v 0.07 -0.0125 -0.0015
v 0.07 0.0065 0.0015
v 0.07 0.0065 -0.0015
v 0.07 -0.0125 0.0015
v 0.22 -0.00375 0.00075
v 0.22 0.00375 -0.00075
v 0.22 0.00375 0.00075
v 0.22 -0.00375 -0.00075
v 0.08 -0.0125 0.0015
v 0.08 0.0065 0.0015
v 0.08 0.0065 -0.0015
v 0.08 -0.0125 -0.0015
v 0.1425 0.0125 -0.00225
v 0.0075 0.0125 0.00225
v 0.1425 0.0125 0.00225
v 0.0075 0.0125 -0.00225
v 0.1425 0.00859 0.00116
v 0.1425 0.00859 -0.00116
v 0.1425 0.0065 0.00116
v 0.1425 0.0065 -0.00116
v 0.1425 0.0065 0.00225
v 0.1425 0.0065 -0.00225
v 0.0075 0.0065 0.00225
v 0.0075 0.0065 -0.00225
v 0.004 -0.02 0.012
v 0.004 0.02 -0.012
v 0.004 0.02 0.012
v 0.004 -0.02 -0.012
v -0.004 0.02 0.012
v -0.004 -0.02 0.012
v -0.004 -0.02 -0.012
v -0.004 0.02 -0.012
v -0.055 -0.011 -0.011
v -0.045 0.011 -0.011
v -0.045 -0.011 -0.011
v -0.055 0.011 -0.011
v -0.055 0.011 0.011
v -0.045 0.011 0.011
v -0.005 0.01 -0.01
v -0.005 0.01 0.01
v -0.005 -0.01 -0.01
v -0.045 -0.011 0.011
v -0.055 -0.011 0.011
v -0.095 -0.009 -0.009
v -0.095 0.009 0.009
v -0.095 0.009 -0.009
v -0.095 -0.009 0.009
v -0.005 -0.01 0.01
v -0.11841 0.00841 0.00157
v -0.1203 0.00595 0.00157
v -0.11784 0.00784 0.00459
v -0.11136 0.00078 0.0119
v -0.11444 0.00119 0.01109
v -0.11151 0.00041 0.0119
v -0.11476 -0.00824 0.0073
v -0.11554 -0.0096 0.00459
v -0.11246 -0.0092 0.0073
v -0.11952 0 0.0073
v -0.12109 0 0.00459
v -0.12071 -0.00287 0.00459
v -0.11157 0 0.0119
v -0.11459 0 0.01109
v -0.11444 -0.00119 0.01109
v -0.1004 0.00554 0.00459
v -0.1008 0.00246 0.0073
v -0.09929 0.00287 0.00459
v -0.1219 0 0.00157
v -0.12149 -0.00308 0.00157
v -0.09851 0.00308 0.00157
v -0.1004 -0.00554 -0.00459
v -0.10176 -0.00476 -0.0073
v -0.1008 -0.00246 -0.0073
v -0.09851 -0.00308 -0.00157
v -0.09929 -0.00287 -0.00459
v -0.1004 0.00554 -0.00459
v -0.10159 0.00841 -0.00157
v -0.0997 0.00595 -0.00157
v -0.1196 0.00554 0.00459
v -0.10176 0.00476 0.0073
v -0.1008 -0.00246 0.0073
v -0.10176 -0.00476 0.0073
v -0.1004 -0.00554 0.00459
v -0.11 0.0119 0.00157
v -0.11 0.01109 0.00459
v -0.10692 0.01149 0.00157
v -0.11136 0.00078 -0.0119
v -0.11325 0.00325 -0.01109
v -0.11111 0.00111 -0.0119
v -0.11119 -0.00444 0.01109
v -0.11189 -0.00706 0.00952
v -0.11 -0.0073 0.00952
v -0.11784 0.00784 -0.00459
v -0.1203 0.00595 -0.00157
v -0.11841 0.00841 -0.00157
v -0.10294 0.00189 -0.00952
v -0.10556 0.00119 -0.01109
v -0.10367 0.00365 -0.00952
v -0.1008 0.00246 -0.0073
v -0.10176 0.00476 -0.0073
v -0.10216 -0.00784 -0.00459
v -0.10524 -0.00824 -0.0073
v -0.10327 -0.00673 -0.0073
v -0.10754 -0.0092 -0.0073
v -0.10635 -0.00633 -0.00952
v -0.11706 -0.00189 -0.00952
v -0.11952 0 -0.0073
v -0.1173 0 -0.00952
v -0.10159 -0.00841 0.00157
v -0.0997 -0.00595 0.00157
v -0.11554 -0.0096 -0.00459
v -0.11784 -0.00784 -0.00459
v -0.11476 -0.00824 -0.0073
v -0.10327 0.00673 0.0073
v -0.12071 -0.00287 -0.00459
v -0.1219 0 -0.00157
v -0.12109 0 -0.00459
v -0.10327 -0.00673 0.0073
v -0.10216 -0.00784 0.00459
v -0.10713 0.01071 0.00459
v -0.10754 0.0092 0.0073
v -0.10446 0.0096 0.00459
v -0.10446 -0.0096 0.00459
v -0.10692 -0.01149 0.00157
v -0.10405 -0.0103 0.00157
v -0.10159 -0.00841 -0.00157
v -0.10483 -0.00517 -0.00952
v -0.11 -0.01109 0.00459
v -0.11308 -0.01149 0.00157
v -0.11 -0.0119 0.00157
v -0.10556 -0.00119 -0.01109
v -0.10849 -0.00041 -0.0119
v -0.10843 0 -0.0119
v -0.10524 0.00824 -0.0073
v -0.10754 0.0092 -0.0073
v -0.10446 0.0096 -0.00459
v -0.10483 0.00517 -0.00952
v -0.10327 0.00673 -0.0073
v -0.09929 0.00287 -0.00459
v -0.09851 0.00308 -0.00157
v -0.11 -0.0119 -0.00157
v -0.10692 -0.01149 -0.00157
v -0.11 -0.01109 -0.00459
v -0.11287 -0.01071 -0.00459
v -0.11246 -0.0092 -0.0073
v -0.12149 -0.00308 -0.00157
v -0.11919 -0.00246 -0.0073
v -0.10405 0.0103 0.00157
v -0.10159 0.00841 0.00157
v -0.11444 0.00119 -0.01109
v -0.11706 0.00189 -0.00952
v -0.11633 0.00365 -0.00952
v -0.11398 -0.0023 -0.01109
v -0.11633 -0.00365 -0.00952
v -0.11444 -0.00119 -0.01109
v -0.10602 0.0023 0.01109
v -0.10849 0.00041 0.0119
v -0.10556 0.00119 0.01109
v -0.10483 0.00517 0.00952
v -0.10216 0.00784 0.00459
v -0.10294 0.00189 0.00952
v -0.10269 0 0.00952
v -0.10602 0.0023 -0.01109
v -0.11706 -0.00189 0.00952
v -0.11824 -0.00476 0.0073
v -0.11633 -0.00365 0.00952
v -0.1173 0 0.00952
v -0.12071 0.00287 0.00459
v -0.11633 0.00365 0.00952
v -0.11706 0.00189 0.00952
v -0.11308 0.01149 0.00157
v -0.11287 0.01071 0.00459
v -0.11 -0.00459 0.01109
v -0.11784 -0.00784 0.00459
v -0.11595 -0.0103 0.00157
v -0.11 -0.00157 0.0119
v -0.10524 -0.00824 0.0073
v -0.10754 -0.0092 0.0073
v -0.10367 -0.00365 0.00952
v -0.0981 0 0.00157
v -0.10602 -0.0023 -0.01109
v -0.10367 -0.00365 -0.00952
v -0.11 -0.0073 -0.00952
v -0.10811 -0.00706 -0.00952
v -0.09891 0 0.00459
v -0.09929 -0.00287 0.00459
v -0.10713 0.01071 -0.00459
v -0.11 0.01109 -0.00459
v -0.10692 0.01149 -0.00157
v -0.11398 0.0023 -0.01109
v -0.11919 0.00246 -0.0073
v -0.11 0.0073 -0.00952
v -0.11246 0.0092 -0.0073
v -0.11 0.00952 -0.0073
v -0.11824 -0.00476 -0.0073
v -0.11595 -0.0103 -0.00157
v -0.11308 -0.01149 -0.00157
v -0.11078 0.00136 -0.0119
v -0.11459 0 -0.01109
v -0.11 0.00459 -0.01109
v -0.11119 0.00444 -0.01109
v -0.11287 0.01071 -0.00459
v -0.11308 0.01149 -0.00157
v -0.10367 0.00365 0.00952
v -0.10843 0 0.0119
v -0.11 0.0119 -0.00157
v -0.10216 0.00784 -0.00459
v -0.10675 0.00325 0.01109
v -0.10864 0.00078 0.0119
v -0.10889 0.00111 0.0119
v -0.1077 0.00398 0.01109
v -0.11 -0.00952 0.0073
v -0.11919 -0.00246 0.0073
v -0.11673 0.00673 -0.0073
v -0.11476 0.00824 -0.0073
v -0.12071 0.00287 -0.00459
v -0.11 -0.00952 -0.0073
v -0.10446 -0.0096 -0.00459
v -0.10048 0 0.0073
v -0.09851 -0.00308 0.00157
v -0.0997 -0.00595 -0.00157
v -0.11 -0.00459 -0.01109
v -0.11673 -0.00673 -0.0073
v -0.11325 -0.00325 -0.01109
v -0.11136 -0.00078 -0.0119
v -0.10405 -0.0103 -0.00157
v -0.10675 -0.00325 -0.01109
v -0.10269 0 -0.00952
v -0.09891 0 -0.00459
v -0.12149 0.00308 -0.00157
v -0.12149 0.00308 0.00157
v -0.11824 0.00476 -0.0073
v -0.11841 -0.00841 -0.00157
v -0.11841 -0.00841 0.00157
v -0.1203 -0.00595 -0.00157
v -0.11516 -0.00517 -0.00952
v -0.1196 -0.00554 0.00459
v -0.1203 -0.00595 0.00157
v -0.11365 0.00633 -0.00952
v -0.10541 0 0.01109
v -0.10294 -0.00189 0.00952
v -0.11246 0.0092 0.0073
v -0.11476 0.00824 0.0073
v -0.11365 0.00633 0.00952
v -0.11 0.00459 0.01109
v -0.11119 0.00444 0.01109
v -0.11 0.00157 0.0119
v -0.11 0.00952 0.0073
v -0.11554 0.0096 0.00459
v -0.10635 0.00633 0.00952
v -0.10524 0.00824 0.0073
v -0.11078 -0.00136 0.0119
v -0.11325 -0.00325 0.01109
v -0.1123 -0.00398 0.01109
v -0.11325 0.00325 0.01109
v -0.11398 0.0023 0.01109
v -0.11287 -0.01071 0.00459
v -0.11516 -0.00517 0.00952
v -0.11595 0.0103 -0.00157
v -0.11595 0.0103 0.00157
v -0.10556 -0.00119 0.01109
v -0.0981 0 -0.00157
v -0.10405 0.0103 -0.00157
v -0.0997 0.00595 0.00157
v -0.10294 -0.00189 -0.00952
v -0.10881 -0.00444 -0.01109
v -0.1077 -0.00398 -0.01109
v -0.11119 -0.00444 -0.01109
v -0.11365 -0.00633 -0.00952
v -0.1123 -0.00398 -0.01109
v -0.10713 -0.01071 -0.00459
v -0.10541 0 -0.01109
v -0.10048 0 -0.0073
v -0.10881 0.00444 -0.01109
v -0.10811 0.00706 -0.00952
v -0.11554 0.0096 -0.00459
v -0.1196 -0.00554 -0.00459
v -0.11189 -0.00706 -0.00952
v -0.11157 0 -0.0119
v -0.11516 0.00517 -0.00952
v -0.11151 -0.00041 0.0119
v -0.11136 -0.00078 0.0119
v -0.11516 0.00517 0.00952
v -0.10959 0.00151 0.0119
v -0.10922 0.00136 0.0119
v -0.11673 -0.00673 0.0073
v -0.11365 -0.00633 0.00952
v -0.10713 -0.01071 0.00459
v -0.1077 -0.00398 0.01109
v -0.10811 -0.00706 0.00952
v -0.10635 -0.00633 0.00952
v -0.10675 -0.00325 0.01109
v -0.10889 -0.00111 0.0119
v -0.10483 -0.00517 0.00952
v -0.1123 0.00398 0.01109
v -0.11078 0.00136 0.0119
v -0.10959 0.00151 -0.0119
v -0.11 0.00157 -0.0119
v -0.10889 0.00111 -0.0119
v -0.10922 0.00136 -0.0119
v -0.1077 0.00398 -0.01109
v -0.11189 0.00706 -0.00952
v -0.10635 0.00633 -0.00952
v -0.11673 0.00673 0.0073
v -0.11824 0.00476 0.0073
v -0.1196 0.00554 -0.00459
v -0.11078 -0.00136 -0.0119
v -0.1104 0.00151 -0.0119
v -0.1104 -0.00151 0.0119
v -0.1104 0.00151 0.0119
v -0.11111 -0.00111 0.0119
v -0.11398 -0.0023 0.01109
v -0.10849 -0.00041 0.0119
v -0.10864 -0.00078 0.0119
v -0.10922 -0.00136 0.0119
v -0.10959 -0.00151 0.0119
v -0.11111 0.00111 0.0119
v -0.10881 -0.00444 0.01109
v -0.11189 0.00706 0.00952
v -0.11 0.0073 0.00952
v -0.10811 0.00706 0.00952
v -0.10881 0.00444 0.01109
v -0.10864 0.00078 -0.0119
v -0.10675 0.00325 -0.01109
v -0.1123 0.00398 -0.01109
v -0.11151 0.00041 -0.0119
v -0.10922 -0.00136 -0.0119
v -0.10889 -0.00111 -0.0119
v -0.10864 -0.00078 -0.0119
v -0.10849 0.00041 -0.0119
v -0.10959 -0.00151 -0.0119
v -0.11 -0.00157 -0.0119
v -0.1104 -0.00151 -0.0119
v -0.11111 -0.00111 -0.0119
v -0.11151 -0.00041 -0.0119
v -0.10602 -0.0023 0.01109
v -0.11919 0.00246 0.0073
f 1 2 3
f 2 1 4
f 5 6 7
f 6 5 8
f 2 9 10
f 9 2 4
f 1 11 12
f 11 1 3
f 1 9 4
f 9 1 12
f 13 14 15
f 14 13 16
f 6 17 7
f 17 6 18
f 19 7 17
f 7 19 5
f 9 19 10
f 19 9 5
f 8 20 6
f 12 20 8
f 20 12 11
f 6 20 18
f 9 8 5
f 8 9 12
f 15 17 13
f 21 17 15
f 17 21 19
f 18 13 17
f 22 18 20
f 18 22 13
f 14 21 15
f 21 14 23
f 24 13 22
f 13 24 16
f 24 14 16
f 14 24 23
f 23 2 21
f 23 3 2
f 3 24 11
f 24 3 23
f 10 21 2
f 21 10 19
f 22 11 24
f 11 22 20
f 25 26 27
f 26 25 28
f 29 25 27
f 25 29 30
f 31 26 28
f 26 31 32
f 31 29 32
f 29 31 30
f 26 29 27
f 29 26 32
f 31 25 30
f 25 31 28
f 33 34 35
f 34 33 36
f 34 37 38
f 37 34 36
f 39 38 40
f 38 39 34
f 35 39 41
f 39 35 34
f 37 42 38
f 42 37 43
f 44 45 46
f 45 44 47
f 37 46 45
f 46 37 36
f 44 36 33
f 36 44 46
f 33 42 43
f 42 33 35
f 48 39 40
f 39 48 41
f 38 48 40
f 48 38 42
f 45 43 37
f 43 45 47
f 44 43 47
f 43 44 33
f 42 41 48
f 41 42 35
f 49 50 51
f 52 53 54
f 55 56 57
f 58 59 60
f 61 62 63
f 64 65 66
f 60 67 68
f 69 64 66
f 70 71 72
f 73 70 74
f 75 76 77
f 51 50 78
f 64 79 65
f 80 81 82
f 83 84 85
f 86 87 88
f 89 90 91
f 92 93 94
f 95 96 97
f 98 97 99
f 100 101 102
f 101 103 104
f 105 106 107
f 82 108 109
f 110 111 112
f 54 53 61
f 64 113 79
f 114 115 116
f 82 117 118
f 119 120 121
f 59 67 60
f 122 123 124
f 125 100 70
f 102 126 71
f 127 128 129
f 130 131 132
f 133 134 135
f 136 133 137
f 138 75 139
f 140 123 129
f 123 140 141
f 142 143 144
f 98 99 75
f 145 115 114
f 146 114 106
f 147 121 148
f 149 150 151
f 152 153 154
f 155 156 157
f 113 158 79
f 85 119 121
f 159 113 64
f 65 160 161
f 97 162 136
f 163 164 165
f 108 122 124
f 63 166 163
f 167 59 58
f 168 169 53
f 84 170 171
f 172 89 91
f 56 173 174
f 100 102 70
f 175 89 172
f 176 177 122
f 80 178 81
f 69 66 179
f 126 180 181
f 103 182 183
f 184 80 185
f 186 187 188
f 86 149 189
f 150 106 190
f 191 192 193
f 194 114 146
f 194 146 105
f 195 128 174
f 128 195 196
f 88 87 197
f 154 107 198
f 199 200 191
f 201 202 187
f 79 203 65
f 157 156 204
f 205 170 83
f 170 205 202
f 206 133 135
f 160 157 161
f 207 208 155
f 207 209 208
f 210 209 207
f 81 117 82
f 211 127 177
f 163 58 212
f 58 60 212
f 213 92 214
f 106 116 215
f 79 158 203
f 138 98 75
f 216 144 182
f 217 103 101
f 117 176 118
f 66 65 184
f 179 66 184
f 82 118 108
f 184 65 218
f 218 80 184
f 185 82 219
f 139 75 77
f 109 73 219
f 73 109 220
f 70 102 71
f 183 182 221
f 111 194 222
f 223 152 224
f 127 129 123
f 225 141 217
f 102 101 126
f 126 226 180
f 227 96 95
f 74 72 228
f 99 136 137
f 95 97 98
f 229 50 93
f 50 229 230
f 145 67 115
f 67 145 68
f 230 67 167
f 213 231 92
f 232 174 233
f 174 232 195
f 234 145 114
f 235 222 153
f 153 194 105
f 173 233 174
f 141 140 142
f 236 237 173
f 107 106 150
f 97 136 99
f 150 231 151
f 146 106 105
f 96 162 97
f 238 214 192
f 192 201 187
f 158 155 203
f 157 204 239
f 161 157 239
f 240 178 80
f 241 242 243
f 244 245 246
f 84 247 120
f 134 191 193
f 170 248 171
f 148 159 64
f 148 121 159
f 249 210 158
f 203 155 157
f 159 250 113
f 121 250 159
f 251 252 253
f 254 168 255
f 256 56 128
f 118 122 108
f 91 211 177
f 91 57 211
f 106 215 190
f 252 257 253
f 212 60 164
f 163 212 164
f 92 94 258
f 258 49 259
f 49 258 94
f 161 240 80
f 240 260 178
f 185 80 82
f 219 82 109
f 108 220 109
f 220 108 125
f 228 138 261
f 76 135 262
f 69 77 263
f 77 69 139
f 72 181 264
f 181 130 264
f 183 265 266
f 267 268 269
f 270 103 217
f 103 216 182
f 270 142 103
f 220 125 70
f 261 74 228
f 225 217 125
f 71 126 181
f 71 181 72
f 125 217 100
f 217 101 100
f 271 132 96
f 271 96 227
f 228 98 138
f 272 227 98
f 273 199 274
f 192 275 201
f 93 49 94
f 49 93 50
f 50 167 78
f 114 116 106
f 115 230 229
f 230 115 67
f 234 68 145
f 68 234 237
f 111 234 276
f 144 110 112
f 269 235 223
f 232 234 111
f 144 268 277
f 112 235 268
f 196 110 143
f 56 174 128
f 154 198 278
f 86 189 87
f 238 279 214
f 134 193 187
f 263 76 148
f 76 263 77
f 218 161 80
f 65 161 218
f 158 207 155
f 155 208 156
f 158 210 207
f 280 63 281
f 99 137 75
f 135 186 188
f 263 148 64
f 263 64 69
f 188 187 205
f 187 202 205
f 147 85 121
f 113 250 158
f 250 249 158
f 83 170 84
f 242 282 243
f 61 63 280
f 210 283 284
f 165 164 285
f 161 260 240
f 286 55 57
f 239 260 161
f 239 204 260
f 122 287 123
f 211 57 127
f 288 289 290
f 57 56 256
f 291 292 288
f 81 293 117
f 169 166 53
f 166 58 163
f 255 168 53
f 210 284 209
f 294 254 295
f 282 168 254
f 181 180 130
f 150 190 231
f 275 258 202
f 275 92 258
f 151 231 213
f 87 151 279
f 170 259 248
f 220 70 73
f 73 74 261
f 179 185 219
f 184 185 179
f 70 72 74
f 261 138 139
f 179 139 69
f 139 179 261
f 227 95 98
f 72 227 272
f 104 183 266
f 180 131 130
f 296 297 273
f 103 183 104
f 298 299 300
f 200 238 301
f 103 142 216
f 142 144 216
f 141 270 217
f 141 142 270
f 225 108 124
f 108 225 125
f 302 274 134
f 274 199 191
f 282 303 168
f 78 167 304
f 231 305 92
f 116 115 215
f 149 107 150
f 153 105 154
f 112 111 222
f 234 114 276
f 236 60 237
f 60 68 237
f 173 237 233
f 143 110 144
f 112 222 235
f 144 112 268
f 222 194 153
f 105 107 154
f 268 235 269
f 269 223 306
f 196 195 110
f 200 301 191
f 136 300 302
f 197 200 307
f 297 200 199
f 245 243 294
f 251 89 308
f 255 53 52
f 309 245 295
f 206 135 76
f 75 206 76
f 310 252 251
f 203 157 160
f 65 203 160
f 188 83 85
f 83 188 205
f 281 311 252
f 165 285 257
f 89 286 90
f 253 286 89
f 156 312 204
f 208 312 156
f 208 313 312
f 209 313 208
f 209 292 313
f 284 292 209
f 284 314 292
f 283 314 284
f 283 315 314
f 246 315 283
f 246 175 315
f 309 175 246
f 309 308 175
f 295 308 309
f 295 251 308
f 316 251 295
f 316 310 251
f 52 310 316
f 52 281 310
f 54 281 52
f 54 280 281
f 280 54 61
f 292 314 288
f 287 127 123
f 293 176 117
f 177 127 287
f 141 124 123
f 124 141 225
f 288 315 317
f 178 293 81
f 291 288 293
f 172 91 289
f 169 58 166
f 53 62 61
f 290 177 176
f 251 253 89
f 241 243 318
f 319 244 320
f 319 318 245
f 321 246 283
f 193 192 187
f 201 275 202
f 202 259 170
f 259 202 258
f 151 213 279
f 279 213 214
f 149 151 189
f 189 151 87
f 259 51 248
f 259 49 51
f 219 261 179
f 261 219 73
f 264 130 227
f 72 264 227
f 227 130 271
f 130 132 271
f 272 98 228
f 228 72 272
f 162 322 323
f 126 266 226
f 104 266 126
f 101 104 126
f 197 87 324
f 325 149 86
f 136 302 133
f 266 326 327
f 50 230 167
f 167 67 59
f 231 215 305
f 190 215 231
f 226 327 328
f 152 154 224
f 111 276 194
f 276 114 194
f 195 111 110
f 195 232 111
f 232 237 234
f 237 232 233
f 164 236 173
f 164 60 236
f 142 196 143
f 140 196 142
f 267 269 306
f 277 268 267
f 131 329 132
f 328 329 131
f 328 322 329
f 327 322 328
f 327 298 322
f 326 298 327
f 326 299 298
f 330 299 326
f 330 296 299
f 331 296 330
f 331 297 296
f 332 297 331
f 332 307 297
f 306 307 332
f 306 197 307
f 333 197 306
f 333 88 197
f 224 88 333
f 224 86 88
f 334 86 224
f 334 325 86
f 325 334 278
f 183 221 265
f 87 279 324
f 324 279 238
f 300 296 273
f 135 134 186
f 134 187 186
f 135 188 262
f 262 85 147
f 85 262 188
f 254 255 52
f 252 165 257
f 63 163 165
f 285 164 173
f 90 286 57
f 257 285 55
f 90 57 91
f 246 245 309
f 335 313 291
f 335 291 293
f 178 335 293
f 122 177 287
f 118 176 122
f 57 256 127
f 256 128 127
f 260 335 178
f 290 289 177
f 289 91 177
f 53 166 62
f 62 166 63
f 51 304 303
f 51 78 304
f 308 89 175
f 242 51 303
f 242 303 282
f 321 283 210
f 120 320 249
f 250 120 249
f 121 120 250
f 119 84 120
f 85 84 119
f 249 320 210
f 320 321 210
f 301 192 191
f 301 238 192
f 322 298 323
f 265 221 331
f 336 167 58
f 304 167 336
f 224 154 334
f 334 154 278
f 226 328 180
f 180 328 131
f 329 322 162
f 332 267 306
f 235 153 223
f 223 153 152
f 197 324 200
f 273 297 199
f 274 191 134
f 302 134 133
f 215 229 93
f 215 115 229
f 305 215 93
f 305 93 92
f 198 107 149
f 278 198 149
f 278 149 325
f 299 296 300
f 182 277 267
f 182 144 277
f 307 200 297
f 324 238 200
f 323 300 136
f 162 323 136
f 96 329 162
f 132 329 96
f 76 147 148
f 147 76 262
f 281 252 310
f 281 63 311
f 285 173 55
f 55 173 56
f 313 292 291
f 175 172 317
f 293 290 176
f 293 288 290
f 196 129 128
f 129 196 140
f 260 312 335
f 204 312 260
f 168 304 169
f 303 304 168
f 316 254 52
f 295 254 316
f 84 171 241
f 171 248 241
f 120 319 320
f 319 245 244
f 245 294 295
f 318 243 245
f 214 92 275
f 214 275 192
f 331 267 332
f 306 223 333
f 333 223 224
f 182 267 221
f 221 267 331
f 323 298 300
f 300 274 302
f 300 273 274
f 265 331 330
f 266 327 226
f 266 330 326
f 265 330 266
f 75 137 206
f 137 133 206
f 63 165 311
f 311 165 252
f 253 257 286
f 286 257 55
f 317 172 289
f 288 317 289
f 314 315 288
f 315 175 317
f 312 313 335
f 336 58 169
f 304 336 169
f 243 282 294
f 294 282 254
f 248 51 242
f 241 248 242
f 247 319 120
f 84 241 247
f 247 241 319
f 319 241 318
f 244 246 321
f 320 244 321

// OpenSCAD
// Arena Shooter - Knife Model
// Combat knife (~25cm total length)
// Units in meters

$fn = 24;

// Knife dimensions
total_length = 0.25;
blade_length = 0.15;
blade_width = 0.025;
blade_thickness = 0.003;
handle_length = 0.1;
handle_width = 0.025;
handle_thickness = 0.02;
guard_width = 0.04;
guard_thickness = 0.008;

module knife() {
    // Blade
    color([0.8, 0.8, 0.85])
    translate([blade_length/2, 0, 0])
        hull() {
            // Blade base
            cube([0.01, blade_width, blade_thickness], center=true);

            // Blade tip
            translate([blade_length - 0.01, 0, 0])
                scale([1, 0.3, 0.5])
                cube([0.01, blade_width, blade_thickness], center=true);
        }

    // Blade spine (thicker top edge)
    color([0.7, 0.7, 0.75])
    translate([blade_length/2, blade_width/2 - blade_thickness, 0])
        cube([blade_length * 0.9, blade_thickness * 2, blade_thickness * 1.5], center=true);

    // Guard
    color([0.3, 0.3, 0.3])
    translate([0, 0, 0])
        cube([guard_thickness, guard_width, handle_thickness * 1.2], center=true);

    // Handle
    color([0.4, 0.25, 0.1])
    translate([-handle_length/2, 0, 0])
        scale([1, 0.8, 1])
        hull() {
            // Handle front
            translate([handle_length/2 - 0.01, 0, 0])
                cube([0.01, handle_width, handle_thickness], center=true);

            // Handle middle (slightly wider)
            translate([0, 0, 0])
                cube([0.01, handle_width * 1.1, handle_thickness * 1.1], center=true);

            // Handle back
            translate([-handle_length/2 + 0.01, 0, 0])
                cube([0.01, handle_width * 0.9, handle_thickness * 0.9], center=true);
        }

    // Pommel
    color([0.3, 0.3, 0.3])
    translate([-handle_length - 0.01, 0, 0])
        sphere(r=handle_thickness * 0.6);
}

// Generate the model (centered, blade pointing in +X direction)
knife();
